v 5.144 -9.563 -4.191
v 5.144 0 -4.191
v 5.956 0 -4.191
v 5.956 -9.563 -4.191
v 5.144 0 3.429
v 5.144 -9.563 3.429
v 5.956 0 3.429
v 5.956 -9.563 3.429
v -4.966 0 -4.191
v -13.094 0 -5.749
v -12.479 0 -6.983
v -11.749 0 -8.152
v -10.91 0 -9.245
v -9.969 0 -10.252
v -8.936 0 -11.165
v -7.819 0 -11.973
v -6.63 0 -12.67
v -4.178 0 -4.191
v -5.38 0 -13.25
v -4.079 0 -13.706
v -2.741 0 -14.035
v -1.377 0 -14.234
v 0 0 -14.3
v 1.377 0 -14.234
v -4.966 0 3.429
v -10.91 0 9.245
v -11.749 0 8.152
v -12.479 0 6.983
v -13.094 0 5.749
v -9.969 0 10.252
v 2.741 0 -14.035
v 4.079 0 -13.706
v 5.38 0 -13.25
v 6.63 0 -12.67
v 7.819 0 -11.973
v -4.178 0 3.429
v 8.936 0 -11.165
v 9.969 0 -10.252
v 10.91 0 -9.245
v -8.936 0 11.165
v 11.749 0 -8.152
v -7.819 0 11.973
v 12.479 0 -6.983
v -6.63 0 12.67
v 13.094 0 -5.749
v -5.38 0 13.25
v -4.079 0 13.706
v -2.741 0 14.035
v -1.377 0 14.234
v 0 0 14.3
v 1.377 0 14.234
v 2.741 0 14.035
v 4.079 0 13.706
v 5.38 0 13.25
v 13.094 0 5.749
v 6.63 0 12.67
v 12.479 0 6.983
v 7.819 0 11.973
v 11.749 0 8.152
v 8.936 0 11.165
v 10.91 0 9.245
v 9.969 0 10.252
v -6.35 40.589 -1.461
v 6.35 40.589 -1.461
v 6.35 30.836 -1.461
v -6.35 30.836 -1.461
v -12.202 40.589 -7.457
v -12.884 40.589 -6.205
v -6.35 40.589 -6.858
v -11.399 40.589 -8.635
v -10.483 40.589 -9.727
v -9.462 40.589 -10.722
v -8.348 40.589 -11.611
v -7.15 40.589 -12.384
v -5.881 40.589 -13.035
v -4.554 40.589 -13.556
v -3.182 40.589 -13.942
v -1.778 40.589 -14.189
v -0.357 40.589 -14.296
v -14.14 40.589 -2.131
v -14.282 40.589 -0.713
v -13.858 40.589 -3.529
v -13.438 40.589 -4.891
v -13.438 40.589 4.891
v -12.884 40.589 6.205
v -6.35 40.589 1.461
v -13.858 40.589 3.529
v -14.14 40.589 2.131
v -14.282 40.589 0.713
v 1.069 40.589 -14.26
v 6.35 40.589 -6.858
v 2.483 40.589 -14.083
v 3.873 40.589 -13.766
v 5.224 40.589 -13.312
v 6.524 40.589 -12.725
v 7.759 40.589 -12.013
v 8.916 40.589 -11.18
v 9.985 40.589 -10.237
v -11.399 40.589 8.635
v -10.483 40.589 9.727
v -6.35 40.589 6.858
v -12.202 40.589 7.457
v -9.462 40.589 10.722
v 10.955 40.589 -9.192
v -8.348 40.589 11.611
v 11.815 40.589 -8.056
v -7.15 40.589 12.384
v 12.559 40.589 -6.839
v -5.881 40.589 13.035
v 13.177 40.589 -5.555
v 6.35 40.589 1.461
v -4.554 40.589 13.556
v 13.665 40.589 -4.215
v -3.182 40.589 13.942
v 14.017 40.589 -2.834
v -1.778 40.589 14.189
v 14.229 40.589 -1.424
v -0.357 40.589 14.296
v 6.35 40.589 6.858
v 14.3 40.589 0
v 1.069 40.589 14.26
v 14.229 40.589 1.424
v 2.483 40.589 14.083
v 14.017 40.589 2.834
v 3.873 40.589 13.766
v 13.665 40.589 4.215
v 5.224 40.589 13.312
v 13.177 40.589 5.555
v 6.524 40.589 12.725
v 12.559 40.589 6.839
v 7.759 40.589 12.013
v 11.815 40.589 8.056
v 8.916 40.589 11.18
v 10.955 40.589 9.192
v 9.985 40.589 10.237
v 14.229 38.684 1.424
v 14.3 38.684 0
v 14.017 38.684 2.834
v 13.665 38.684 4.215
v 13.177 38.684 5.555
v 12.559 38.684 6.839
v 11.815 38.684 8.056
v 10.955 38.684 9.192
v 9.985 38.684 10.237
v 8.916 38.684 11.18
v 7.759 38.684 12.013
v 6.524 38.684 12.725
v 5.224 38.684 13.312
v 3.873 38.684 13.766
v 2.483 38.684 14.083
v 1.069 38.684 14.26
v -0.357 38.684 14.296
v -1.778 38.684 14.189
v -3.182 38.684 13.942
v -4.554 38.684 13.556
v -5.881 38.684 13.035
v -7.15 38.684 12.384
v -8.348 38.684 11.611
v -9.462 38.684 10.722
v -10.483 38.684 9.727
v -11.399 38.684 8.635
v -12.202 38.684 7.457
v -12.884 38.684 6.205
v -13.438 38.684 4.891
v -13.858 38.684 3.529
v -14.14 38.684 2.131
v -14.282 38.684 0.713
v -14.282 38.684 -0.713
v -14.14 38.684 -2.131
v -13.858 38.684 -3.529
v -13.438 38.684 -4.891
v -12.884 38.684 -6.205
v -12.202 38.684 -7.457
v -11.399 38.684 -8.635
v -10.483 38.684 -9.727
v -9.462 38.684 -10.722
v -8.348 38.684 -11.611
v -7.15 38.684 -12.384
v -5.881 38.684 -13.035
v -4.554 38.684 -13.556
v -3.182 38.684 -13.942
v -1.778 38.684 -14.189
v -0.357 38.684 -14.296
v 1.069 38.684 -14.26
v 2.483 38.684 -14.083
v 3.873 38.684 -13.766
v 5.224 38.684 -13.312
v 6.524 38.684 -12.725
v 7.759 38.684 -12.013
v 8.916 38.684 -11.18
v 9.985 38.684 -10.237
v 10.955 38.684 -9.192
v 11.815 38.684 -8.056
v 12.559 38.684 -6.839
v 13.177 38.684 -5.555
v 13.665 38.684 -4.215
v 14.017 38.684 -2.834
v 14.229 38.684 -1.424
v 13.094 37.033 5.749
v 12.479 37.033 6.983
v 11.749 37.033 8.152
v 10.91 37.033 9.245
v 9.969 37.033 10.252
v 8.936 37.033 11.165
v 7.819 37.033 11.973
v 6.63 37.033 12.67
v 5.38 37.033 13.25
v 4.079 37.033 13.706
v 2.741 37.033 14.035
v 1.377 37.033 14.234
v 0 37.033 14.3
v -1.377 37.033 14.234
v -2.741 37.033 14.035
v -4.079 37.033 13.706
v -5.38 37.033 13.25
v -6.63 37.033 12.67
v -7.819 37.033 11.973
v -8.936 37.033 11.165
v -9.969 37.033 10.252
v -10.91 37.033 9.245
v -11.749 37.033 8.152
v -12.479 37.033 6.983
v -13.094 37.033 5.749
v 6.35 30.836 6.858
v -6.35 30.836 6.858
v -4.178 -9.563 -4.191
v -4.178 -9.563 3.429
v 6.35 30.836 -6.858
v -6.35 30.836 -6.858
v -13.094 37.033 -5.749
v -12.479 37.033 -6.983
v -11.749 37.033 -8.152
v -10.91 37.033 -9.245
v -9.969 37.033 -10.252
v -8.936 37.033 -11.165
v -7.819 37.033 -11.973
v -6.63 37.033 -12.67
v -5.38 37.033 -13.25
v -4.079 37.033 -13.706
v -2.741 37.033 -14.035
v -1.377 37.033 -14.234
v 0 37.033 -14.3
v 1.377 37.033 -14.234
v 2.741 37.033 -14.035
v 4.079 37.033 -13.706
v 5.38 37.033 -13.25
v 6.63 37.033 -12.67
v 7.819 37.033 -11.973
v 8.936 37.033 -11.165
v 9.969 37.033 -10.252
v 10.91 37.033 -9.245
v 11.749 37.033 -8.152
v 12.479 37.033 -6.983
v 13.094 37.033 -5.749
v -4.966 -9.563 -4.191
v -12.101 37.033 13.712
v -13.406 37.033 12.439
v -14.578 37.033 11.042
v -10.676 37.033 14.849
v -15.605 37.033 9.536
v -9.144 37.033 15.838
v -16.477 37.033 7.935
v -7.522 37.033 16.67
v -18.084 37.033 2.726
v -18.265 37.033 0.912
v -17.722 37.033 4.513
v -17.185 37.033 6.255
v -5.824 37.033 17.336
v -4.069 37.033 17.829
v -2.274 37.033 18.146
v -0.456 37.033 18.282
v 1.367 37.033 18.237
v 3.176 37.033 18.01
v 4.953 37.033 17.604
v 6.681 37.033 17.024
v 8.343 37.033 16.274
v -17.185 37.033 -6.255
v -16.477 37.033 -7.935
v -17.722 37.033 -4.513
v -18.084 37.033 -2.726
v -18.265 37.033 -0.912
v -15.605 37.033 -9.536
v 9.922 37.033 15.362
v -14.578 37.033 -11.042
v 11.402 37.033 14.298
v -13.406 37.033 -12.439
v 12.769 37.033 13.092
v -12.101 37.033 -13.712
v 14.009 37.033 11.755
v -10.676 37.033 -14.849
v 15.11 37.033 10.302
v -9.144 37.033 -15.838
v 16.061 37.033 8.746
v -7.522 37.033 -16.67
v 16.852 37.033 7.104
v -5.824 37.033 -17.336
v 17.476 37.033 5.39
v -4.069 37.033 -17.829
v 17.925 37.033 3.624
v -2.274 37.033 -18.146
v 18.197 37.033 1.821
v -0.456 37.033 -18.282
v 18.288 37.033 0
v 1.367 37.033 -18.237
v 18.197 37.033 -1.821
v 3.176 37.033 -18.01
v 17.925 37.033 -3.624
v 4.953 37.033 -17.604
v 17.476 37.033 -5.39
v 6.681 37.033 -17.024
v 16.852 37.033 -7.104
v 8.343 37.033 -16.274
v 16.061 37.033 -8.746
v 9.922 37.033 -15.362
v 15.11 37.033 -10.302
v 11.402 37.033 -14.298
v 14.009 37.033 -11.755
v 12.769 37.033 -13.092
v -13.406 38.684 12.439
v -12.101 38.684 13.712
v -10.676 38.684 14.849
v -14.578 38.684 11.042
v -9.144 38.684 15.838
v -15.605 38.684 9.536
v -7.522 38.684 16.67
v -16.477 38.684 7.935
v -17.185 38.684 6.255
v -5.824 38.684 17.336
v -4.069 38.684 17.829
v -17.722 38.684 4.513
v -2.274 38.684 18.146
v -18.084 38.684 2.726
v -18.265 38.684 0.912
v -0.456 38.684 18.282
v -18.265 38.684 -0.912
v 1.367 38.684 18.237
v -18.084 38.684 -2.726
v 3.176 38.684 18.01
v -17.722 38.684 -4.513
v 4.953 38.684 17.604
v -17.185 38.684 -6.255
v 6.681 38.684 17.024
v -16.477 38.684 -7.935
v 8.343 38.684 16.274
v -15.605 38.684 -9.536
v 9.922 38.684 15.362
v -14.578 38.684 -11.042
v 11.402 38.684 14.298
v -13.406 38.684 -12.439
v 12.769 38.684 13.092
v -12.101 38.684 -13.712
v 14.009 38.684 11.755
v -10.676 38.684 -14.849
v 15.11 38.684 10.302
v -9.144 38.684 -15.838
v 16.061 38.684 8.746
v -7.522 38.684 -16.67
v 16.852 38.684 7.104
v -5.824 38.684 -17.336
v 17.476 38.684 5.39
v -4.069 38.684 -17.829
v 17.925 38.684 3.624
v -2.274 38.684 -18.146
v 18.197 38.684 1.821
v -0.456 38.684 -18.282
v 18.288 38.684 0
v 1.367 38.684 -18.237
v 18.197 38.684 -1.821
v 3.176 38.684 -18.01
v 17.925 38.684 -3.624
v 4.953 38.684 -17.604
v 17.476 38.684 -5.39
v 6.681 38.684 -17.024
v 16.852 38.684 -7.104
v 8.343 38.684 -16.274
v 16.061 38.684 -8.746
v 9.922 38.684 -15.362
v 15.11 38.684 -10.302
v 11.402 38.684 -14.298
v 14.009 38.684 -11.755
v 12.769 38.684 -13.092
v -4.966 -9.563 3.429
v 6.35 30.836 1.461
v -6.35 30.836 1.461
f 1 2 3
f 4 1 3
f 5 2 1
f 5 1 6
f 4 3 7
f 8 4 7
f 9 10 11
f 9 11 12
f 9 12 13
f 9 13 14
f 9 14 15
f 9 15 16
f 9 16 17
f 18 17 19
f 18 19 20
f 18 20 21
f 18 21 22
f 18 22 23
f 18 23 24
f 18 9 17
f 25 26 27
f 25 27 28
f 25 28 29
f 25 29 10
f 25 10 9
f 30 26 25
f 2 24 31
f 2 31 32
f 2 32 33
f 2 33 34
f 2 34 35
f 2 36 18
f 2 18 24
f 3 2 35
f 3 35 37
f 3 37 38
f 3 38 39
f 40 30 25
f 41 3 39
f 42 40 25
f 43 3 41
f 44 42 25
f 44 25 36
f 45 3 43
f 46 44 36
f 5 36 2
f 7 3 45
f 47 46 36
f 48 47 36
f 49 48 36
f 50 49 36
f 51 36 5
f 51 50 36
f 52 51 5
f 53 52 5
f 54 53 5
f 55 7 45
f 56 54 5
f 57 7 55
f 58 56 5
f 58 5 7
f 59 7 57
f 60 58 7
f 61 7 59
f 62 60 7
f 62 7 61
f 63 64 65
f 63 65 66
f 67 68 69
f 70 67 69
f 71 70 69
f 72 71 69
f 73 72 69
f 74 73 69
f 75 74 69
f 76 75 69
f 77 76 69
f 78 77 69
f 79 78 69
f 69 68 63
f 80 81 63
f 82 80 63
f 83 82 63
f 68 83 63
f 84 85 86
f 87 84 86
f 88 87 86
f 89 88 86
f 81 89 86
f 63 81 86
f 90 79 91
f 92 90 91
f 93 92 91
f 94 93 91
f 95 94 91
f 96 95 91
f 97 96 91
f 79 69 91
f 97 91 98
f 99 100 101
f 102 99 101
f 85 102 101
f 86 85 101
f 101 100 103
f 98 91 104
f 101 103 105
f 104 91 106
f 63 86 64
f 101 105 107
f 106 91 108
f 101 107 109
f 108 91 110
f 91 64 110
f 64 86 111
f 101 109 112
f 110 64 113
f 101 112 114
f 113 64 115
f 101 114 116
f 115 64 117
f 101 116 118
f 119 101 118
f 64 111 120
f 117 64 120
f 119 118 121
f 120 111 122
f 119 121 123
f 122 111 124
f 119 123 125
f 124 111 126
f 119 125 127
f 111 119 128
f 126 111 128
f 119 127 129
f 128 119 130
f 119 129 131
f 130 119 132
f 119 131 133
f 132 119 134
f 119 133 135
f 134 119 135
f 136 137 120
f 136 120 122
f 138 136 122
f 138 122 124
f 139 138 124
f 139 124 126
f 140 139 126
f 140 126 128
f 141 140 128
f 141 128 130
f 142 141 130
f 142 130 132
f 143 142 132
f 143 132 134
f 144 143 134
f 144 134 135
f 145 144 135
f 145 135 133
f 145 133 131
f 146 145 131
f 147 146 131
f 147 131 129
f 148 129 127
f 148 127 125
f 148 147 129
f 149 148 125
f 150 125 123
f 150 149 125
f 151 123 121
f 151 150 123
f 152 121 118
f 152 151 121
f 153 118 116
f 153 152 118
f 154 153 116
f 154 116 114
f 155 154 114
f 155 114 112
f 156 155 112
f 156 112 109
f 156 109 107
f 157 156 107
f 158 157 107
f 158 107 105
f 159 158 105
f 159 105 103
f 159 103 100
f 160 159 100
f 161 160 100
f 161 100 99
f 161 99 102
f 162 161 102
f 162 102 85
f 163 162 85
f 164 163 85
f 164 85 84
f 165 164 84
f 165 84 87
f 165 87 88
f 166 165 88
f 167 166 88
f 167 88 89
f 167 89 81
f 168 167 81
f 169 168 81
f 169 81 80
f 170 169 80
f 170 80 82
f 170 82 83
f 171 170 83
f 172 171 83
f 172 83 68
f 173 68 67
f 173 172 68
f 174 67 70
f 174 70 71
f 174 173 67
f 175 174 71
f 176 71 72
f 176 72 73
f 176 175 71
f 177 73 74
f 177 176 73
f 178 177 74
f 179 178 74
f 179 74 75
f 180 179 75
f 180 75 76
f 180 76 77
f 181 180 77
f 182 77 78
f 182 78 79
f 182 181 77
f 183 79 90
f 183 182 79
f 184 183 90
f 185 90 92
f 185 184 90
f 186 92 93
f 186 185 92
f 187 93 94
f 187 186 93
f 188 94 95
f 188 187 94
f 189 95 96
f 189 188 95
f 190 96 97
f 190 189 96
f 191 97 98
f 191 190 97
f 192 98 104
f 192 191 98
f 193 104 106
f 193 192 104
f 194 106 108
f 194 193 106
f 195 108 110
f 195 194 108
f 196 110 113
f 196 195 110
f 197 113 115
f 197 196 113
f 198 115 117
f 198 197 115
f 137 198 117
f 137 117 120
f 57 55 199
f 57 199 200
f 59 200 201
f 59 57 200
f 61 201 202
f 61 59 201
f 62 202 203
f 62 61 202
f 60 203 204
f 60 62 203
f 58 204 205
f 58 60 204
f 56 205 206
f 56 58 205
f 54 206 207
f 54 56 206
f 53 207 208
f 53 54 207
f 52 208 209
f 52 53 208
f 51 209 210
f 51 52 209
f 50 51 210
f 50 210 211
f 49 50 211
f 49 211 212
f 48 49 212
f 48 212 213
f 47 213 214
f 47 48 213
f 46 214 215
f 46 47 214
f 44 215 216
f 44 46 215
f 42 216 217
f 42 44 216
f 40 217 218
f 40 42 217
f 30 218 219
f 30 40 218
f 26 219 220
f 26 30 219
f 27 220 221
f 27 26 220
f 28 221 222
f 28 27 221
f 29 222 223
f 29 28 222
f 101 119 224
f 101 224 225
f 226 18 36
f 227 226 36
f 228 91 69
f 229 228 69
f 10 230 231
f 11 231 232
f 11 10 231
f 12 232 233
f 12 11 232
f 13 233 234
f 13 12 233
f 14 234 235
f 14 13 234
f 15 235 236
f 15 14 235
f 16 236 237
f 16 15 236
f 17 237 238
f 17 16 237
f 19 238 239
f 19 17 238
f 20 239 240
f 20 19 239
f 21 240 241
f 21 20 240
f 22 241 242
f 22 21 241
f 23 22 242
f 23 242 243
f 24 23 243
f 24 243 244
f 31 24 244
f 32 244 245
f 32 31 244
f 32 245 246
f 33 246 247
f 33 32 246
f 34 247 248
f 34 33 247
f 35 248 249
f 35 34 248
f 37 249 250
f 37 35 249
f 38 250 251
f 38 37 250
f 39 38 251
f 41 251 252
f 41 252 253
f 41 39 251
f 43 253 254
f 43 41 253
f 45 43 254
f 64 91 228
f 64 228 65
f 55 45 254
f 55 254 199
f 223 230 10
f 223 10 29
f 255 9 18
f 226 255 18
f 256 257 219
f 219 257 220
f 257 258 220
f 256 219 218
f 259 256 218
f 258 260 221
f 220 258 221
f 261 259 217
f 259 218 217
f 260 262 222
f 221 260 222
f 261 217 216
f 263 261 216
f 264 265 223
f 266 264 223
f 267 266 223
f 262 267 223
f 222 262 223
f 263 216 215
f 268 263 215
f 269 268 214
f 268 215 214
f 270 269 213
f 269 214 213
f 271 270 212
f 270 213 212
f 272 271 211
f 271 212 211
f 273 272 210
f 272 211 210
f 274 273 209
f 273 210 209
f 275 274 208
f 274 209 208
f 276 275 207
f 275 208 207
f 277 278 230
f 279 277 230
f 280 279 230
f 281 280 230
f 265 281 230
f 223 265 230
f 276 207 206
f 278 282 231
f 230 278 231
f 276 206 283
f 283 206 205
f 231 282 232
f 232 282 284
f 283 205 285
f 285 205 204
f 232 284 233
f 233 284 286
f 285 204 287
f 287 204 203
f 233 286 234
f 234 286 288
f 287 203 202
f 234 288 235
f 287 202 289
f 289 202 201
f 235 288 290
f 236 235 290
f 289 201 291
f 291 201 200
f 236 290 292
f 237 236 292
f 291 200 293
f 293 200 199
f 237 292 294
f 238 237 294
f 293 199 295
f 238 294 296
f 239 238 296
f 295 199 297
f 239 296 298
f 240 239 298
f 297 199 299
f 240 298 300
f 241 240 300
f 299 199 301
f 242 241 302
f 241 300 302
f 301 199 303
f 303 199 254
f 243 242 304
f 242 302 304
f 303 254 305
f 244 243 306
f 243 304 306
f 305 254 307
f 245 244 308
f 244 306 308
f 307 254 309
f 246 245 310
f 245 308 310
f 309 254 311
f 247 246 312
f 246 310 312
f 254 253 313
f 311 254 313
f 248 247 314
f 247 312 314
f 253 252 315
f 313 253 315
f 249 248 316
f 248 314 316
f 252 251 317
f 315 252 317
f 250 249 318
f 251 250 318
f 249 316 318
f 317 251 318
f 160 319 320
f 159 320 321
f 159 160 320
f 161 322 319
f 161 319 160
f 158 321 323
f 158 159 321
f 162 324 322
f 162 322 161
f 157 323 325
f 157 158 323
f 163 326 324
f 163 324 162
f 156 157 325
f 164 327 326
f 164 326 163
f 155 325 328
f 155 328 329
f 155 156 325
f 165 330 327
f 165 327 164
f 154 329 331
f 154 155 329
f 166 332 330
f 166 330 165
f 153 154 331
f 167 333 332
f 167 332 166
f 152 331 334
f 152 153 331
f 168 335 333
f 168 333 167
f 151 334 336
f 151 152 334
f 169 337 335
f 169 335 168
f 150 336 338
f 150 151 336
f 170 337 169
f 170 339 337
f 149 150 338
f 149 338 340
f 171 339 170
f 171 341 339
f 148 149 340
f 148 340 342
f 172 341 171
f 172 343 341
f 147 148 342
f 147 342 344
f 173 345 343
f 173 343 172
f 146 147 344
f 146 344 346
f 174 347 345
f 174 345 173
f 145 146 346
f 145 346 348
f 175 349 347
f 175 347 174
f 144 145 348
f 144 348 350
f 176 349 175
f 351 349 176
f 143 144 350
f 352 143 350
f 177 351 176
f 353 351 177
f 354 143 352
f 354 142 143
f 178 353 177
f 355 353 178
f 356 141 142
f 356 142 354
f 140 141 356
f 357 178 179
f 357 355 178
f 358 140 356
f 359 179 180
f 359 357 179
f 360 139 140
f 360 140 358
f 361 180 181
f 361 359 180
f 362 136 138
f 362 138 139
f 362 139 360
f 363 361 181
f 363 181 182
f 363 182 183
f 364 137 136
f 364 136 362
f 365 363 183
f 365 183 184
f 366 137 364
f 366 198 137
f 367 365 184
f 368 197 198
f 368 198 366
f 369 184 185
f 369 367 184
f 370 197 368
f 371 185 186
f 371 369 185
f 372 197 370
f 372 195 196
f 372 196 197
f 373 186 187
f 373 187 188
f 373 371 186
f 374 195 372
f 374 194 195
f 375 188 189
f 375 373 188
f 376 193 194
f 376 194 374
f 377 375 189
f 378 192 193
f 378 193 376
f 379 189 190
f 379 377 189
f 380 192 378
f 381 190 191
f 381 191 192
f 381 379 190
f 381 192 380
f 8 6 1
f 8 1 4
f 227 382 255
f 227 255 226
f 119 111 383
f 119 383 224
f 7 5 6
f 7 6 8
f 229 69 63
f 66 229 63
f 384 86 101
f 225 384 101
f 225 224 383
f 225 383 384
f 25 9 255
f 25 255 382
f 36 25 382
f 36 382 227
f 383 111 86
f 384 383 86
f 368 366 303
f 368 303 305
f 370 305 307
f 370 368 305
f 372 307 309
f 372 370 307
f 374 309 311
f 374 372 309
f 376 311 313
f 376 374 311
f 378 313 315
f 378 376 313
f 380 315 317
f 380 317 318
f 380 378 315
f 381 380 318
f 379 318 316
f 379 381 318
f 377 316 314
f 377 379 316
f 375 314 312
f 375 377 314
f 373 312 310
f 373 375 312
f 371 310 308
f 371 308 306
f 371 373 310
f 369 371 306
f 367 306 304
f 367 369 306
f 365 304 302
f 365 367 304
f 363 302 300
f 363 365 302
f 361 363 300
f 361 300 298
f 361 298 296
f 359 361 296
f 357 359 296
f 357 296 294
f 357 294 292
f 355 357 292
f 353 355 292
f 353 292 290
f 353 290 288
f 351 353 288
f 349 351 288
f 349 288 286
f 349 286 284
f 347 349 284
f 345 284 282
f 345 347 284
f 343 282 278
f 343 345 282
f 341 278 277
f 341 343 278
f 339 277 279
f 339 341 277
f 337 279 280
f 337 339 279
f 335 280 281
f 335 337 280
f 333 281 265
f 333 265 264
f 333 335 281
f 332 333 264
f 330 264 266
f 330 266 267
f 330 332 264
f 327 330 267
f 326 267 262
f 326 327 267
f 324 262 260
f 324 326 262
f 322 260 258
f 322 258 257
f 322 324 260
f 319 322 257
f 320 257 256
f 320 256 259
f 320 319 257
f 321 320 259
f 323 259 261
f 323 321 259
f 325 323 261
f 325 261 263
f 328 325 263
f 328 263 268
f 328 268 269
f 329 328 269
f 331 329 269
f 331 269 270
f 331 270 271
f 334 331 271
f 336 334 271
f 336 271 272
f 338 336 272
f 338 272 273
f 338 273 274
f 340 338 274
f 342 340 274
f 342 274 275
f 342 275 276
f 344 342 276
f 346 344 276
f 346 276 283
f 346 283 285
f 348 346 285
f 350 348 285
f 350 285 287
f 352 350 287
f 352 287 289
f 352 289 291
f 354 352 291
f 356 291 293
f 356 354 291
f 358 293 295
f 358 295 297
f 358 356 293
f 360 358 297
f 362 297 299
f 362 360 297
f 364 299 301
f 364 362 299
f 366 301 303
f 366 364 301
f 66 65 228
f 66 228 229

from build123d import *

# Parameters (mm, degrees)
F0_R      = 14.3002
F1_DEPTH  = 40.5892
F2_W      = 11.867738
F2_H      = 43.622876
F2_W_2    = 10.350018
F3_DEPTH  = 37.084
F5_R      = 18.288
F6_DEPTH  = 1.651
F7_W      = 12.7
F7_H      = 5.3975
F8_DEPTH  = 9.7536
F9_W      = 0.7874
F9_H      = 7.62
F9_W_2    = 0.8128
F10_DEPTH = 9.5631


with BuildPart() as f1:
    # F0 (on Front) → F1 (new body)
    with BuildSketch(Plane.XZ):
        Circle(F0_R)
    extrude(amount=-F1_DEPTH)

    # F2 (on face) → F3 (cut)
    with BuildSketch(Plane.XZ):
        with Locations((-19.027569, 0.496973)):
            Rectangle(F2_W, F2_H)
        with Locations((18.268709, 0.496973)):
            Rectangle(F2_W_2, F2_H)
    extrude(amount=-F3_DEPTH, mode=Mode.SUBTRACT)

    # F5 (on offset) → F6 (join)
    with BuildSketch(Plane(origin=(0, 38.6842, 0), x_dir=(1, 0, 0), z_dir=(0, 1, 0))):
        Circle(F5_R)
    extrude(amount=-F6_DEPTH)

    # F7 (on face) → F8 (cut)
    with BuildSketch(Plane(origin=(0, 40.5892, 0), x_dir=(-1, 0, 0), z_dir=(0, 1, 0))):
        with Locations((0, 4.15925)):
            Rectangle(F7_W, F7_H)
        with Locations((0, -4.15925)):
            Rectangle(F7_W, F7_H)
    extrude(amount=-F8_DEPTH, mode=Mode.SUBTRACT)

    # F9 (on face) → F10 (join)
    with BuildSketch(Plane.XZ):
        with Locations((-4.572, -0.381)):
            Rectangle(F9_W, F9_H)
        with Locations((5.5499, -0.381)):
            Rectangle(F9_W_2, F9_H)
    extrude(amount=F10_DEPTH)


solid = f1.part
